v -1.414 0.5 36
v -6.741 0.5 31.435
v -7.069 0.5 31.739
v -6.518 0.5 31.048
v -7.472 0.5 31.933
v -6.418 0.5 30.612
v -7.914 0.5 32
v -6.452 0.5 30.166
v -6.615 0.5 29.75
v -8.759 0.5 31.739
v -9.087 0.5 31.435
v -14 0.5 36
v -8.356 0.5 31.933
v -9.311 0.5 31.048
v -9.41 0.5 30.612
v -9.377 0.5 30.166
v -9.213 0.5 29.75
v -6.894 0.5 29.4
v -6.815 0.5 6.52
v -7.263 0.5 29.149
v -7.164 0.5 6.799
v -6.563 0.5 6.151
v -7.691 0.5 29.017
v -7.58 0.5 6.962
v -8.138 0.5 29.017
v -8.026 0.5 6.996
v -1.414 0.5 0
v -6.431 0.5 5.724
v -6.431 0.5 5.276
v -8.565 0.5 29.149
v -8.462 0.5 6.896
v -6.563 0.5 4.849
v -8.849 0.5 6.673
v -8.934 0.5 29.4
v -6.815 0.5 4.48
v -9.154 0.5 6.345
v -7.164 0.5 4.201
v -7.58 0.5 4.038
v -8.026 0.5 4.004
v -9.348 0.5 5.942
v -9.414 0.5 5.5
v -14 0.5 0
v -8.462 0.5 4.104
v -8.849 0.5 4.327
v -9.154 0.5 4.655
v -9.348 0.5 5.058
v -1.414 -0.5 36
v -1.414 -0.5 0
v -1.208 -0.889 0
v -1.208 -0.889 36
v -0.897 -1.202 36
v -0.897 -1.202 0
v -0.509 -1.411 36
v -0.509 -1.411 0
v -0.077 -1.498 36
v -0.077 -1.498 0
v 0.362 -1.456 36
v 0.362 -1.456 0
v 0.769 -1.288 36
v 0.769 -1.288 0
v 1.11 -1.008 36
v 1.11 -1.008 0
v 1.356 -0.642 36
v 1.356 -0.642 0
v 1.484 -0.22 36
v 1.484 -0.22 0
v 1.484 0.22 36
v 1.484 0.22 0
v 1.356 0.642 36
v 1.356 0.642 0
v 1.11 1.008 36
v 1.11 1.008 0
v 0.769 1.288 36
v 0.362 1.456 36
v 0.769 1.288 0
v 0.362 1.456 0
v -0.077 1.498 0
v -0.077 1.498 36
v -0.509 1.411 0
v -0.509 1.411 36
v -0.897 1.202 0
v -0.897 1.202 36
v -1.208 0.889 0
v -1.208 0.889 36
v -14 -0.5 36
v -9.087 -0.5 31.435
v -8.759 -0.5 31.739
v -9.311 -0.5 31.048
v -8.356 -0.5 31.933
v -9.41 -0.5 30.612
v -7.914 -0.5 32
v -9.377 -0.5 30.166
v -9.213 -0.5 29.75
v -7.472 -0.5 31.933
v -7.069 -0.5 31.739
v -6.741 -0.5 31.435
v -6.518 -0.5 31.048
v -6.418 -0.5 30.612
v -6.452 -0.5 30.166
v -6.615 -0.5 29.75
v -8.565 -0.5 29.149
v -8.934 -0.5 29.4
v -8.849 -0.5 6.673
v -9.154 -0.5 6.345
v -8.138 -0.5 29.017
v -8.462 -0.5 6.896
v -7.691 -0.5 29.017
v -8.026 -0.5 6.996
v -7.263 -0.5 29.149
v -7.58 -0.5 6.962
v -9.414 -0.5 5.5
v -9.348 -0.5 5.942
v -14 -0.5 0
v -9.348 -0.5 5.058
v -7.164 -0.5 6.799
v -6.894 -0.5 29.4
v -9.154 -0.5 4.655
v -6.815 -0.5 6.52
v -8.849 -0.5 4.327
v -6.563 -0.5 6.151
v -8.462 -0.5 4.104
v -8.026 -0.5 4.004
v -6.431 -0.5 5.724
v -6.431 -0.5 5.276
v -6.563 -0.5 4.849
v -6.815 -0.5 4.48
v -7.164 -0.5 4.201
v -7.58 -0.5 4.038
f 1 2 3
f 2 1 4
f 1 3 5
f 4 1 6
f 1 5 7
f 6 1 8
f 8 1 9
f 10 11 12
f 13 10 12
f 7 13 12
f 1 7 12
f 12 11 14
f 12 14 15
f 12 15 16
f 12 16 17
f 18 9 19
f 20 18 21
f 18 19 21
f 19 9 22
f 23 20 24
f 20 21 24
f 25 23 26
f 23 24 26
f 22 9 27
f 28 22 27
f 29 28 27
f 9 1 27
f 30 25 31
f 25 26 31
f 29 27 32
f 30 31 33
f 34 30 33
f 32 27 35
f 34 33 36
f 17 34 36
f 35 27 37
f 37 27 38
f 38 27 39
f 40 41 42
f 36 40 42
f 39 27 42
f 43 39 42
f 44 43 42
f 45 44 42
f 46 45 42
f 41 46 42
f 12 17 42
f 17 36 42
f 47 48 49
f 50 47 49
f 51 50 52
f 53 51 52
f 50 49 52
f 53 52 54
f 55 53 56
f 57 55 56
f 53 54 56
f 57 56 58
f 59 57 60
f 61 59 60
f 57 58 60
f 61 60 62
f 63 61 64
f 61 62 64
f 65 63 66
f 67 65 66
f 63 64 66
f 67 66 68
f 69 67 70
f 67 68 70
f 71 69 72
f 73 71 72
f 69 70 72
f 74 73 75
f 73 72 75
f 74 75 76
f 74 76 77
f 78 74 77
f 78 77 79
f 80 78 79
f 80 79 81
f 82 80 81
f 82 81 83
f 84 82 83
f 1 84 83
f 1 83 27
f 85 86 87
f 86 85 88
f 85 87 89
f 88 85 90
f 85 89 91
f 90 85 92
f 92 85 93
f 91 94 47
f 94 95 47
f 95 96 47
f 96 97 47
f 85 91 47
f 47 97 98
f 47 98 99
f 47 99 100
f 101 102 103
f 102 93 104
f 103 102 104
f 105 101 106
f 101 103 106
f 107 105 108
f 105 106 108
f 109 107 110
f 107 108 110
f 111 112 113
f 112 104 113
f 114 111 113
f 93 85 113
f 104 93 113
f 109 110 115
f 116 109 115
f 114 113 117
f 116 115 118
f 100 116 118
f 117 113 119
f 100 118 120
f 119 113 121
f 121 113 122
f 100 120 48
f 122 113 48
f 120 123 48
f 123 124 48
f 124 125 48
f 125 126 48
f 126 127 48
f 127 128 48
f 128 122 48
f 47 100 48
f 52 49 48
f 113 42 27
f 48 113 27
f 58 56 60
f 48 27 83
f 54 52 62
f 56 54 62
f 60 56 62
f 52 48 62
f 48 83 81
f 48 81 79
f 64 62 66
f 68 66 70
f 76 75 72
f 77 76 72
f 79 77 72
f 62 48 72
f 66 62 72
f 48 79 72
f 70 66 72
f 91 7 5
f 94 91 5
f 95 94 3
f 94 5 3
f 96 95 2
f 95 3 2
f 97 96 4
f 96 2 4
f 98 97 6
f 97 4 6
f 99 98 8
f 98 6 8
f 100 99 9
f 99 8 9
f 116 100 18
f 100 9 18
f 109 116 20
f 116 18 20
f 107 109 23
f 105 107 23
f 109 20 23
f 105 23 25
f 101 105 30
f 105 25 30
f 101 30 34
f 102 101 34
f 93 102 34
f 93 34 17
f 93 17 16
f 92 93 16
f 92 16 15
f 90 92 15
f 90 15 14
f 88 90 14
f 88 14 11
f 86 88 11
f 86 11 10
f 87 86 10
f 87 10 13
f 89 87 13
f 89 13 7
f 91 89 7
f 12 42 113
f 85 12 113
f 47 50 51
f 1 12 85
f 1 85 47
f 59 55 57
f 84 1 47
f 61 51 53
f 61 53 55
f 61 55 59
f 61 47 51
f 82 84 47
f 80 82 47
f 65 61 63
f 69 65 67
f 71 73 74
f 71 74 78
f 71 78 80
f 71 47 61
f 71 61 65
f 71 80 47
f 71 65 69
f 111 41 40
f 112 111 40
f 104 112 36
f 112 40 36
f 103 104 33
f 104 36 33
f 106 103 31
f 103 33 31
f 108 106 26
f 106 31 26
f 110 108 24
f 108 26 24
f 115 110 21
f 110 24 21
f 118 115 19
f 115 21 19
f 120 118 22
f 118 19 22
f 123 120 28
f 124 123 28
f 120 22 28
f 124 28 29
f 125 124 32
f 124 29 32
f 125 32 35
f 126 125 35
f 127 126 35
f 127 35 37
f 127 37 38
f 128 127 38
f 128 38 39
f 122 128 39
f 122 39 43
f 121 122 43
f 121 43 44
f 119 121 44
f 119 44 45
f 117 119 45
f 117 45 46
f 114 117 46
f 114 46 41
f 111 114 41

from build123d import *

# Parameters (mm, degrees)
EXTRUDE_1_DEPTH     = 36
SKETCH_2_R          = 1.5
CUT_EXTRUDE_1_DEPTH = 39.678159212


with BuildPart() as part:
    # 草图1 → 凸台-拉伸1 (new body)
    with BuildSketch(Plane.XY):
        with BuildLine():
            Line((-1.414213562, 0.5), (-14, 0.5))
            Line((-14, 0.5), (-14, -0.5))
            Line((-14, -0.5), (-1.414213562, -0.5))
            ThreePointArc((-1.414213562, -0.5), (1.5, 0), (-1.414213562, 0.5))
        make_face()
    extrude(amount=EXTRUDE_1_DEPTH)

    # 草图2 → 切除-拉伸1 (cut, through all)
    with BuildSketch(Plane(origin=(0, 0.5, 0), x_dir=(1, 0, 0), z_dir=(0, 1, 0))):
        with Locations(Location((-7.914213562, -5.5, 0), (0, 0, 180))):
            Circle(SKETCH_2_R)
        with Locations(Location((-7.914213562, -30.5, 0), (0, 0, 270))):
            Circle(SKETCH_2_R)
    extrude(amount=-CUT_EXTRUDE_1_DEPTH, mode=Mode.SUBTRACT)


solid = part.part
